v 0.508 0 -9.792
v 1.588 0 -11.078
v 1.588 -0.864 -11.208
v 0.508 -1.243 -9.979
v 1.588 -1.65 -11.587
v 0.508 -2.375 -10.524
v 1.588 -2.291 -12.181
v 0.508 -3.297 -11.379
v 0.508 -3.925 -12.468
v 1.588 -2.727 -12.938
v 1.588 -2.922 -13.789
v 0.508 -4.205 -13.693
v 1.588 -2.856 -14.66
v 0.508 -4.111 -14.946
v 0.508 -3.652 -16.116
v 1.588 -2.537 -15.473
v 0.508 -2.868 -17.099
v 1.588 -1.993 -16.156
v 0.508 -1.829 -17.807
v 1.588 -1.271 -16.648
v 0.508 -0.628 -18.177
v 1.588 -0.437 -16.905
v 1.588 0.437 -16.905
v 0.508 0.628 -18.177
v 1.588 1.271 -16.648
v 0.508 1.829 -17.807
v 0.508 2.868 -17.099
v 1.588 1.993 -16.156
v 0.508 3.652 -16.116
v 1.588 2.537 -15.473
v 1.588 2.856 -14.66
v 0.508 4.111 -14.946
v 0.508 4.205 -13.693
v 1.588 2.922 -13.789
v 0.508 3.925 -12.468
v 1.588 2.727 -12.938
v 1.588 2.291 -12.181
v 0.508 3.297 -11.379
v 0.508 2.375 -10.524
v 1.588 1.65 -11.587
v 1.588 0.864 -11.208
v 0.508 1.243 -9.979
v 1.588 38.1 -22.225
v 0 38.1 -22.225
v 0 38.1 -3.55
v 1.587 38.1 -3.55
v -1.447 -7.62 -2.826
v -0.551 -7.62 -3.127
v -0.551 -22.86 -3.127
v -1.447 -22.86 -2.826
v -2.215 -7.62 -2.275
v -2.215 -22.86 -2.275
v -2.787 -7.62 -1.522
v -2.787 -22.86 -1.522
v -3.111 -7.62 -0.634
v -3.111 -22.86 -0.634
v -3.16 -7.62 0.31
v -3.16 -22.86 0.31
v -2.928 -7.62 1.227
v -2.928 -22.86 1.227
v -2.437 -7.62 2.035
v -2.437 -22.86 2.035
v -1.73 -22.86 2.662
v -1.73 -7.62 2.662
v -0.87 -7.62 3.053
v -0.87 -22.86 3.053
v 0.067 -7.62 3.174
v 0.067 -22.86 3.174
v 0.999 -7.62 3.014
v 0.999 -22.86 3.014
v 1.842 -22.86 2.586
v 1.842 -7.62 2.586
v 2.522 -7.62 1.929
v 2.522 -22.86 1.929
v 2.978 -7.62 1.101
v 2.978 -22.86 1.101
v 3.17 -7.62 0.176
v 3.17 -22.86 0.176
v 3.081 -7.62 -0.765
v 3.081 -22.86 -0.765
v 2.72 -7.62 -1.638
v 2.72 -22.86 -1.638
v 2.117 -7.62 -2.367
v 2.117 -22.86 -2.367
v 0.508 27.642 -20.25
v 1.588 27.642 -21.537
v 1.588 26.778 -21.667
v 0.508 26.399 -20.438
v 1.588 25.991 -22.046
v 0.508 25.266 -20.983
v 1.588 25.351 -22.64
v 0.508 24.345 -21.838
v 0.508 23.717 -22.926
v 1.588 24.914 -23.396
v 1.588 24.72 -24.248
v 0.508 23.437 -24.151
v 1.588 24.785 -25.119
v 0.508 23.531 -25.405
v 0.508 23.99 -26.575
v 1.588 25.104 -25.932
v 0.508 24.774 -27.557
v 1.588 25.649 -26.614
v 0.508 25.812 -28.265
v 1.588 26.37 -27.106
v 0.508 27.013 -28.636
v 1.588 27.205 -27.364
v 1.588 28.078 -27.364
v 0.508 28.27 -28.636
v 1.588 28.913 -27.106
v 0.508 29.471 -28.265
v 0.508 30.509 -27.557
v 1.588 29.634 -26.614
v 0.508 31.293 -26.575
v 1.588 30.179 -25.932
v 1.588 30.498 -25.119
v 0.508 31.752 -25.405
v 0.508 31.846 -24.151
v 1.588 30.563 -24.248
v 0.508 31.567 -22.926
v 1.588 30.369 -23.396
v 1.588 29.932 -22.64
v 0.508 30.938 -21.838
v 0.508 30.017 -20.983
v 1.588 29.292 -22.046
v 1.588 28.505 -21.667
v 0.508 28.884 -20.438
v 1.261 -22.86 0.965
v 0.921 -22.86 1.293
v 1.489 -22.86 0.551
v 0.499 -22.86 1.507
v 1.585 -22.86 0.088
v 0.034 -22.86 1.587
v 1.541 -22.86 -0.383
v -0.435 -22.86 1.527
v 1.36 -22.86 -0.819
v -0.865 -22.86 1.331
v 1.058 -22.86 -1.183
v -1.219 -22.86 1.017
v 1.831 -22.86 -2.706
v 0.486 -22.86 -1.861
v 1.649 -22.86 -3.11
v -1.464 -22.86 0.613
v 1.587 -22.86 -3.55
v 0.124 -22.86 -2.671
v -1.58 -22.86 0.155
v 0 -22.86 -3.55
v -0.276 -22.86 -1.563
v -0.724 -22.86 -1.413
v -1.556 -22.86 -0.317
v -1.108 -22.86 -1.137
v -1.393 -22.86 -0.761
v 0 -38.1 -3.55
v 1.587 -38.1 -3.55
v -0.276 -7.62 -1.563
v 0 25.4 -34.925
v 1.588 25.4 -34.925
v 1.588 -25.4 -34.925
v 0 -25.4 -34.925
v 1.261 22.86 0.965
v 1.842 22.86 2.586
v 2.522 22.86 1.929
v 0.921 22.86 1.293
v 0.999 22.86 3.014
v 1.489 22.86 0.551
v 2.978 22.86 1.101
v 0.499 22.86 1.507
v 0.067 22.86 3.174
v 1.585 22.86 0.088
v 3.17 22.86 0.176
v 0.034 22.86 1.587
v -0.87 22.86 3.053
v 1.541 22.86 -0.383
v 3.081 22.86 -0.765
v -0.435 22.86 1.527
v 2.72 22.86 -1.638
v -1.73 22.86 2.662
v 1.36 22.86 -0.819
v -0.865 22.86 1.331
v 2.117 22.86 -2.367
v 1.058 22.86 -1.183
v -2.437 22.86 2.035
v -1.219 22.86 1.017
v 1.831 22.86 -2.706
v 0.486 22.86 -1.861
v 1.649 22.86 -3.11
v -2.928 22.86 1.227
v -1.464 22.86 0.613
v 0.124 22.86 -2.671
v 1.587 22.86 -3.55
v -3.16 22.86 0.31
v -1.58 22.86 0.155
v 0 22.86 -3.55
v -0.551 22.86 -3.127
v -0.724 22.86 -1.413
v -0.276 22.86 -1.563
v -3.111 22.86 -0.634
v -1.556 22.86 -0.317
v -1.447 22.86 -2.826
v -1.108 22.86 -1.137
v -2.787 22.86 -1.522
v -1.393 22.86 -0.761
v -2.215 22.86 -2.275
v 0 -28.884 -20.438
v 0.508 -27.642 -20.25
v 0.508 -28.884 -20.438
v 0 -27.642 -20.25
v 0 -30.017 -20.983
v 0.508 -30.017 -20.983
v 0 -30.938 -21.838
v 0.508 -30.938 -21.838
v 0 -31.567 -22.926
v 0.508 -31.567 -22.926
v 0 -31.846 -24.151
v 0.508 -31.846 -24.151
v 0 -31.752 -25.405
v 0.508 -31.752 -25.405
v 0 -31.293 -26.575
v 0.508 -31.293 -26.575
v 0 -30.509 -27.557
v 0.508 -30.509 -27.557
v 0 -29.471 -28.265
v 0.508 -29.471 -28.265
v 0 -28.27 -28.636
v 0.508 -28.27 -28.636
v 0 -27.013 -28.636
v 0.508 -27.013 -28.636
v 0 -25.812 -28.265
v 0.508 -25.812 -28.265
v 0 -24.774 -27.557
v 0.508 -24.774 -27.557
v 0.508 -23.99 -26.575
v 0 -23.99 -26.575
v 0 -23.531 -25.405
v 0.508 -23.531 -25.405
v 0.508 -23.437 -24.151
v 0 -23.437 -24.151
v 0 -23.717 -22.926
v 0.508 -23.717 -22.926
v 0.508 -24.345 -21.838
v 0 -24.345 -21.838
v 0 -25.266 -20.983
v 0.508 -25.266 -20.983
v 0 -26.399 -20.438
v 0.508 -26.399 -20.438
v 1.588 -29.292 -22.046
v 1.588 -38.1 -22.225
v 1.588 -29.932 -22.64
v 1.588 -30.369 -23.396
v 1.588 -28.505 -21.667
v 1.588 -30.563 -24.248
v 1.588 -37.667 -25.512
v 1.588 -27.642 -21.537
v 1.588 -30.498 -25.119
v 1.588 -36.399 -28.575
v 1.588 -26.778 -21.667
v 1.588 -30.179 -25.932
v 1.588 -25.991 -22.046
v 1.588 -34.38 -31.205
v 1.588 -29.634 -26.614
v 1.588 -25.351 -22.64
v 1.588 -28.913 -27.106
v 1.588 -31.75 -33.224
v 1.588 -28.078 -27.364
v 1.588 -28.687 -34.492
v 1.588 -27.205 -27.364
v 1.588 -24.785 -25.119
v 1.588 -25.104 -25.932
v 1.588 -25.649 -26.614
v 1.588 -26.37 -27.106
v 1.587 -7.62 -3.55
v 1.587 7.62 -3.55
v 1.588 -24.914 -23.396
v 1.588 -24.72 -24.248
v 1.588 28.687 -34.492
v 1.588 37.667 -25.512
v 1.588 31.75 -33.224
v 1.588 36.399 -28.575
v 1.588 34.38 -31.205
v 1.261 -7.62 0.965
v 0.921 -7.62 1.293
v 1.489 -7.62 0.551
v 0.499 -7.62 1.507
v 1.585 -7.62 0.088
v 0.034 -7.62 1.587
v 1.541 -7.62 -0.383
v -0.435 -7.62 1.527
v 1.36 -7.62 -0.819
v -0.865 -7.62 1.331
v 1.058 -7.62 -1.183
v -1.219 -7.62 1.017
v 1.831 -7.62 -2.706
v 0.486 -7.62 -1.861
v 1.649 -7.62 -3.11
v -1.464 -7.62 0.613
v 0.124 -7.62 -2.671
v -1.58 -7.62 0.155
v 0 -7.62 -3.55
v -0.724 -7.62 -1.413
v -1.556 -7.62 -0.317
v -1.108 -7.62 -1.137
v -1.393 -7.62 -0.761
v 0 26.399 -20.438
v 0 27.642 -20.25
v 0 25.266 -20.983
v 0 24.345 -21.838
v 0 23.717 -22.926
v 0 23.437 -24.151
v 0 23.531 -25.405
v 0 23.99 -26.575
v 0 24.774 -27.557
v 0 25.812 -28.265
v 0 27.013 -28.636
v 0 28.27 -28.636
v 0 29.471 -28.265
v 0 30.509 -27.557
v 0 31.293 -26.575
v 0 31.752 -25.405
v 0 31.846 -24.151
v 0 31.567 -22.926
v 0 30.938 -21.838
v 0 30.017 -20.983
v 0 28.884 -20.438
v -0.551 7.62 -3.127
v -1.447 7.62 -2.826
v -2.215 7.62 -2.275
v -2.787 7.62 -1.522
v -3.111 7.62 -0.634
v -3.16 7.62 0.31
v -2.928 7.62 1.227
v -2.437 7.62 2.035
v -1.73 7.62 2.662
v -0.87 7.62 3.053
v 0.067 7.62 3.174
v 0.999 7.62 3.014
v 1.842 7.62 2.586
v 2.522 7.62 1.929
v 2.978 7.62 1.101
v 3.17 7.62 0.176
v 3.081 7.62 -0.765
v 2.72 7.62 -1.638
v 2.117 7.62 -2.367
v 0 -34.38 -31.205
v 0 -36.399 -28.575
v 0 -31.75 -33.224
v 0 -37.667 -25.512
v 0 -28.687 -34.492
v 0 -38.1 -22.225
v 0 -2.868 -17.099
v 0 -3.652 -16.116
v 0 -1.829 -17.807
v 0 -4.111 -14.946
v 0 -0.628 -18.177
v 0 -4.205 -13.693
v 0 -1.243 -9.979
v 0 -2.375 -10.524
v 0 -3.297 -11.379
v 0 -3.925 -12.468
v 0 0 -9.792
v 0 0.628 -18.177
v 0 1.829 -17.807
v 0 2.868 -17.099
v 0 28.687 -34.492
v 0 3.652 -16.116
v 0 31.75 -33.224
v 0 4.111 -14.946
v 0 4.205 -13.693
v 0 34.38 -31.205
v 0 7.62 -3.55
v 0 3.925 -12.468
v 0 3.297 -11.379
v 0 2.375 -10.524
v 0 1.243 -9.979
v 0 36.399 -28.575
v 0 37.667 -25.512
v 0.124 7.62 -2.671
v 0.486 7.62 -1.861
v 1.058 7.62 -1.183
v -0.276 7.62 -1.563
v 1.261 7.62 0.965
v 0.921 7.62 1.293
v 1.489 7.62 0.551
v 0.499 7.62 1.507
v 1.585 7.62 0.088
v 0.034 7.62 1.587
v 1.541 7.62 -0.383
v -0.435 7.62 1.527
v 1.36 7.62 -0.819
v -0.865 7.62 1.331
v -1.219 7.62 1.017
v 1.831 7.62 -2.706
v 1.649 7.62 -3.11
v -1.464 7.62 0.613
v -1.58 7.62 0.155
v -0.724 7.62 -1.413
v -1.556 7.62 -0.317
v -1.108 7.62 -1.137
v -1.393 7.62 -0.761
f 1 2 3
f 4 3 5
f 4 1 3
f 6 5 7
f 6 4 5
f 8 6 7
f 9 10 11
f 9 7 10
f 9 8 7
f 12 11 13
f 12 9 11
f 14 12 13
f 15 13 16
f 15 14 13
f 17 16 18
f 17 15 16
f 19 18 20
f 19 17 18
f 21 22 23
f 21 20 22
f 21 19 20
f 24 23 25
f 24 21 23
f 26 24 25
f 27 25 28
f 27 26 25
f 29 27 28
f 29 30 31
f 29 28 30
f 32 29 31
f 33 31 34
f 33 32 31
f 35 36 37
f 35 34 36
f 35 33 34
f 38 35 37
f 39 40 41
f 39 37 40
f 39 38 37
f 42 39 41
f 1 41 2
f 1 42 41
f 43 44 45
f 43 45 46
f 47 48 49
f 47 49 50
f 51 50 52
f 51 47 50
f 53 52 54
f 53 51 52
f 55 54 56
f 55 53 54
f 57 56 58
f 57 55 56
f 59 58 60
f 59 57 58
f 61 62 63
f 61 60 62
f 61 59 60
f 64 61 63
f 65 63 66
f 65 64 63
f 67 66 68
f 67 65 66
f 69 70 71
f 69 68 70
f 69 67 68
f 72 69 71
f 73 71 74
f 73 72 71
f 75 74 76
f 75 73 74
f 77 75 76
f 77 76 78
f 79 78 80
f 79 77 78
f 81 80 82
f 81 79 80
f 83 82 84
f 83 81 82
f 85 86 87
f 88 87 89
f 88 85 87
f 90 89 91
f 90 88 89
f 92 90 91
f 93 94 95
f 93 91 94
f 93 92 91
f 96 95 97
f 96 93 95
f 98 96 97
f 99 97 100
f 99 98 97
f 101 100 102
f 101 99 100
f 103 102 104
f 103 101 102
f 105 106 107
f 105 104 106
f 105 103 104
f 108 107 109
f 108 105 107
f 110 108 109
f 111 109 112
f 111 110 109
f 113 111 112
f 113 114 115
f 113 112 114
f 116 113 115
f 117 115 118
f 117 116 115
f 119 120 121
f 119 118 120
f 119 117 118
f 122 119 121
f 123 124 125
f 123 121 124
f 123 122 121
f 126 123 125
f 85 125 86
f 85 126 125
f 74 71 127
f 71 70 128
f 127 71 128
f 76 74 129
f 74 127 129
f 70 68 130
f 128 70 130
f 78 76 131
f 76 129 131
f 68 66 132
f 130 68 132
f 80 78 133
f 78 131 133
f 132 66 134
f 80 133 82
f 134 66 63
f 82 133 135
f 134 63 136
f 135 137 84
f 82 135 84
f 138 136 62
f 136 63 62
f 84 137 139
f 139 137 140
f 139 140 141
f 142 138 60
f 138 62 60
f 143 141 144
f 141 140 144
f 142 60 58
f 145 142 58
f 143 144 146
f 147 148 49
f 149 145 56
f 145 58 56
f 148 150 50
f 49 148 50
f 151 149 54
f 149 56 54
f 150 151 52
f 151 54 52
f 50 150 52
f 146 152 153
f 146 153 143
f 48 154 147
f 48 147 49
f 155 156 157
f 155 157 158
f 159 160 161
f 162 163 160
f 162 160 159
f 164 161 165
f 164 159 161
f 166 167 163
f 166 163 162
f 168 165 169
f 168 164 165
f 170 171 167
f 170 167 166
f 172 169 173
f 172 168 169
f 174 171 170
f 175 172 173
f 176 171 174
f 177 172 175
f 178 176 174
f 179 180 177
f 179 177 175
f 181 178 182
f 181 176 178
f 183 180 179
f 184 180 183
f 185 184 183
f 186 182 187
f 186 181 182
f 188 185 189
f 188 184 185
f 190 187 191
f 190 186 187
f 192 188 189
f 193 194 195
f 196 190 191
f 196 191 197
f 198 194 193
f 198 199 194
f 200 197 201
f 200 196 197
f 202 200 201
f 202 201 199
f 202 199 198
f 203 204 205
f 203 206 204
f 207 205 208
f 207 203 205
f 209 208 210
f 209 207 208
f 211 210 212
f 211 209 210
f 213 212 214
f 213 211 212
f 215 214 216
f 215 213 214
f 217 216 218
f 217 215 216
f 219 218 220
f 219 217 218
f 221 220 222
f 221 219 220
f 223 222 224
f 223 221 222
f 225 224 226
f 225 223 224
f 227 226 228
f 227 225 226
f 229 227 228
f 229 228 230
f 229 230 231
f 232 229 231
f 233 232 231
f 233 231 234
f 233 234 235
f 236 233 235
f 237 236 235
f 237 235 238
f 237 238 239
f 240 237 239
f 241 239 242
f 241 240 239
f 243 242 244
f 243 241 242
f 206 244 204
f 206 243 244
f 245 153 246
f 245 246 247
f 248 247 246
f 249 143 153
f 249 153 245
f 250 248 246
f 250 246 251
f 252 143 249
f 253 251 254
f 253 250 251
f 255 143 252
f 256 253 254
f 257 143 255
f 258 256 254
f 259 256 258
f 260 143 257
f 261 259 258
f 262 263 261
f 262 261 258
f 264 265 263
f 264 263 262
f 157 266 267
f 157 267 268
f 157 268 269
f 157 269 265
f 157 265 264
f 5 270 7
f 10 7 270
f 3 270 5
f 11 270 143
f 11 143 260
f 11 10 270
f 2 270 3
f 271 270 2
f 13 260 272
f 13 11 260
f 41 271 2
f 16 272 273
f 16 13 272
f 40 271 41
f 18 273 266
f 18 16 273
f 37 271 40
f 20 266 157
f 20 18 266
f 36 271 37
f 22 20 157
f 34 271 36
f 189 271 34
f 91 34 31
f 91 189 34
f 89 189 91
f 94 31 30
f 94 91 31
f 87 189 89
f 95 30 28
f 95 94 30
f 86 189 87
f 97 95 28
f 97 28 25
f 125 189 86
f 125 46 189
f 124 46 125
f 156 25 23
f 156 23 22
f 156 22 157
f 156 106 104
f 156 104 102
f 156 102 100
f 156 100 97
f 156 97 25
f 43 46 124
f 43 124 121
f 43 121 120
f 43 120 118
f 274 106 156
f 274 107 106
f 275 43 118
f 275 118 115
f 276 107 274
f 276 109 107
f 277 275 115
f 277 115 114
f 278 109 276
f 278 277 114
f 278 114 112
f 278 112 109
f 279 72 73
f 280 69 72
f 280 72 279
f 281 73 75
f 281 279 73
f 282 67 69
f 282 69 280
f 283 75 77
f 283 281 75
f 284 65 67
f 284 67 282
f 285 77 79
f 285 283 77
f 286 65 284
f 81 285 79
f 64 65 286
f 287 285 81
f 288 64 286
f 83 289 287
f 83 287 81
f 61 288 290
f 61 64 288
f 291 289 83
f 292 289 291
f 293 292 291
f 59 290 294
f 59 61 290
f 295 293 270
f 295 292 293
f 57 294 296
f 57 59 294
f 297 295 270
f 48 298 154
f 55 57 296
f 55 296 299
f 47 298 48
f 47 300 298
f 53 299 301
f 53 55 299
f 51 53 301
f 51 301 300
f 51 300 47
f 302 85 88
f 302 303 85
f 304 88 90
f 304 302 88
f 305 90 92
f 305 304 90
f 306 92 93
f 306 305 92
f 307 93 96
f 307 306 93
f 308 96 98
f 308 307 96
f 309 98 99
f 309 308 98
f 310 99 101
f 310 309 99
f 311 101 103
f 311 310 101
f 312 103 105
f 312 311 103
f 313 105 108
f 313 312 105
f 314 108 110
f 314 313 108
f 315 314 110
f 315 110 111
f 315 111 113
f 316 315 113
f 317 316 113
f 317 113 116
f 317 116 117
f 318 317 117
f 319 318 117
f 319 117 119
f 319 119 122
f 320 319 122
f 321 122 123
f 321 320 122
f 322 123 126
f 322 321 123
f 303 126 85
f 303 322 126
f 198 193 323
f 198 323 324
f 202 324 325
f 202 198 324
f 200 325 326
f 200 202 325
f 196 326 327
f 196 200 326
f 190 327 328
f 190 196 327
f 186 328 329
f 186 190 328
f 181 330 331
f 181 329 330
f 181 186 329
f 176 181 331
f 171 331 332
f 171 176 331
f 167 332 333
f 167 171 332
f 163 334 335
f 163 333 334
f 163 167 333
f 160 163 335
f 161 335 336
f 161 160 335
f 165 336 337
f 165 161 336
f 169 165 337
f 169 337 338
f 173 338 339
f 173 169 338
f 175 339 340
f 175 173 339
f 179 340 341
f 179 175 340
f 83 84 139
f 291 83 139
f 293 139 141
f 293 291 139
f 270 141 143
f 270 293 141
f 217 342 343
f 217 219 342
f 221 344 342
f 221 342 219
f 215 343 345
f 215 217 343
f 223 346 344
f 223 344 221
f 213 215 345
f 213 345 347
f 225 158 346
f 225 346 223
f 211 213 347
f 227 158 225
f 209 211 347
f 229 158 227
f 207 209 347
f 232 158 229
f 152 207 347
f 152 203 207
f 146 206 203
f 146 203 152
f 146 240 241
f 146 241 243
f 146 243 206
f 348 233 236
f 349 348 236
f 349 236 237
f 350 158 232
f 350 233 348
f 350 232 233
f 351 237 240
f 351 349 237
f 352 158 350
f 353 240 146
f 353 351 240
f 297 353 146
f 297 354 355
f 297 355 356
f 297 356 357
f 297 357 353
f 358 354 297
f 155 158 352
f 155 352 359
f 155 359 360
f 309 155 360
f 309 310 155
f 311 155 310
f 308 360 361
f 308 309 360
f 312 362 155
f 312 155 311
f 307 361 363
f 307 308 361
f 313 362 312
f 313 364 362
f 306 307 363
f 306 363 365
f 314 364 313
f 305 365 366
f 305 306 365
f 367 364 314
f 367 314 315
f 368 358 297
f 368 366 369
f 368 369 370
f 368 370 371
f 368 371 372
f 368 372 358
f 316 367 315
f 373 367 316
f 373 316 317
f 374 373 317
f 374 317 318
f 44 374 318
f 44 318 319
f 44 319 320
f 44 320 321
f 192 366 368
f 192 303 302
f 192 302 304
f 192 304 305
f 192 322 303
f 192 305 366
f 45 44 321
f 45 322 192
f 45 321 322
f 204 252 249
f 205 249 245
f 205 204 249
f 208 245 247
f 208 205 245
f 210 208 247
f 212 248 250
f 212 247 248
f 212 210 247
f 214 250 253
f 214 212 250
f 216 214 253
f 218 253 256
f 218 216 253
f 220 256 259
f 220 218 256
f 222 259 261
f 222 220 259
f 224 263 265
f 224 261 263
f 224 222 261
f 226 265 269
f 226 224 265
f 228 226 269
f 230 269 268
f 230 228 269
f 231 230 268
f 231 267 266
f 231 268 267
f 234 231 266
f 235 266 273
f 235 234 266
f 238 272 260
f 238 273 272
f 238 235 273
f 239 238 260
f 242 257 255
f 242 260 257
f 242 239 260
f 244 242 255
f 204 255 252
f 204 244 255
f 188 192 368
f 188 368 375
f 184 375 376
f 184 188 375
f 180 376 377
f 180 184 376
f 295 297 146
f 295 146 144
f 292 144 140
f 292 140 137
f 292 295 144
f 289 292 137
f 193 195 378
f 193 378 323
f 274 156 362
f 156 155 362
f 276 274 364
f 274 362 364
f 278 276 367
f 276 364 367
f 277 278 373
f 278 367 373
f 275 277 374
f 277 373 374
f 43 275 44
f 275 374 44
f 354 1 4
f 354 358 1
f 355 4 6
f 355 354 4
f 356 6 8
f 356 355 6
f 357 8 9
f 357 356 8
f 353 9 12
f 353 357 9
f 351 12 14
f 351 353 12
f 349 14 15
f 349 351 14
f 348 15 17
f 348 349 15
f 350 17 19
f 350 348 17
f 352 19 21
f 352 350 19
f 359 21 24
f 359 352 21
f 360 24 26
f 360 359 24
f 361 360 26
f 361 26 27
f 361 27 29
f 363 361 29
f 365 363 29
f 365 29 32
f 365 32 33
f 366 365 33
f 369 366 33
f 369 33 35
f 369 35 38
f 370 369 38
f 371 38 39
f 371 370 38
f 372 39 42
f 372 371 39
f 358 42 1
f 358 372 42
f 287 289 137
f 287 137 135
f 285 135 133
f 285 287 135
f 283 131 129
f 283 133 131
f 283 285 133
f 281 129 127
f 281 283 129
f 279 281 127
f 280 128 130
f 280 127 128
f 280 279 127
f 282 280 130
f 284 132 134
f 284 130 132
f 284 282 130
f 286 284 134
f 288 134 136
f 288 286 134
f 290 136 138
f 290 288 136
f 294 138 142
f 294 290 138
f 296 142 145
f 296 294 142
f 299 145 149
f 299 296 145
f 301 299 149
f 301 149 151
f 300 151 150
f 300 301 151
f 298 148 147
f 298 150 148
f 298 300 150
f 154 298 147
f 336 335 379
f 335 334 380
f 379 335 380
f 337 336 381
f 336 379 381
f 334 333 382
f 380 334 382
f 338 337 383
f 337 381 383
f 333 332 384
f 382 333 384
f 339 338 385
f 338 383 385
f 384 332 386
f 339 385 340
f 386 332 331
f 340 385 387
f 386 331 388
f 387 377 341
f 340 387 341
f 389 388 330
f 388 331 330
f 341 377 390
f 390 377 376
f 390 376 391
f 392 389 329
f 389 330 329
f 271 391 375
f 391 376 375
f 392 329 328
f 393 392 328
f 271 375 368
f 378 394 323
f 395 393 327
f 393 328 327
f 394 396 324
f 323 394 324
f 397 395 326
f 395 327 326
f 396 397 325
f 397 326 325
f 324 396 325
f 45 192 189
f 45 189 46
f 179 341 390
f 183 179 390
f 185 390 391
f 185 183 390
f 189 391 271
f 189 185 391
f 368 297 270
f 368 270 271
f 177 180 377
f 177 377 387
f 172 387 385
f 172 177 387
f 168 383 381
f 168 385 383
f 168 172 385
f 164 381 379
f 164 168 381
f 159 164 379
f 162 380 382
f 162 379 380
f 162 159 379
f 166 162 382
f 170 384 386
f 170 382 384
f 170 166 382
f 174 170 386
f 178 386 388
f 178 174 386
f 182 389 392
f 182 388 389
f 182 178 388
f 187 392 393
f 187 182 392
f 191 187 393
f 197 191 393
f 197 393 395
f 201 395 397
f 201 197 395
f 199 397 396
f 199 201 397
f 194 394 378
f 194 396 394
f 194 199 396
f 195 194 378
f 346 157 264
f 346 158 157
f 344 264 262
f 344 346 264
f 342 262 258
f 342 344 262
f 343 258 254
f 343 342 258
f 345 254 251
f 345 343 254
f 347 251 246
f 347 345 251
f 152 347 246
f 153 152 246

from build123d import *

# Parameters (mm, degrees)
BOSS_EXTRUDE1_DEPTH                       = 38.1
SKETCH3_W                                 = 6.724757914
SKETCH3_H                                 = 15.24
CUT_EXTRUDE1_DEPTH                        = 4.175
CUT_EXTRUDE1_DEPTH_BACK                   = 4.175
CSK_FOR_8_FLAT_HEAD_MACHINE_SCREW_2_COUNT = 2
CSK_FOR_8_FLAT_HEAD_MACHINE_SCREW_2_PITCH = 29.553945574
CSK_FOR_8_FLAT_HEAD_MACHINE_SCREW_3_COUNT = 2
CSK_FOR_8_FLAT_HEAD_MACHINE_SCREW_3_PITCH = 55.283171943
FILLET1_R                                 = 12.7


with BuildPart() as part:
    # Sketch2 → Boss-Extrude1 (new body, symmetric)
    with BuildSketch(Plane(origin=(0, 0, 0), x_dir=(1, 0, 0), z_dir=(0, 1, 0))):
        with BuildLine():
            Line((1.5875, 34.925), (0, 34.925))
            Line((0, 34.925), (0, 3.549757914))
            ThreePointArc((0, 3.549757914), (0.2766348, 2.253569592), (1.058333333, 1.183252638))
            ThreePointArc((1.058333333, 1.183252638), (-0.435047689, -1.526725175), (-0.275666482, 1.563382308))
            Line((-0.275666482, 1.563382308), (-0.551332964, 3.126764616))
            ThreePointArc((-0.551332964, 3.126764616), (-0.870095378, -3.053450349), (2.116666667, 2.366505276))
            ThreePointArc((2.116666667, 2.366505276), (1.7258174, 2.901663753), (1.5875, 3.549757914))
            Line((1.5875, 3.549757914), (1.5875, 34.925))
        make_face()
    extrude(amount=BOSS_EXTRUDE1_DEPTH, both=True)

    # Sketch3 → Cut-Extrude1 (cut, two sides)
    with BuildSketch(Plane(origin=(0, 0, 0), x_dir=(0, 0, -1), z_dir=(1, 0, 0))) as cut_extrude1_sk:
        with Locations((0.187378957, 30.48)):
            Rectangle(SKETCH3_W, SKETCH3_H)
        with Locations((0.187378957, 0)):
            Rectangle(SKETCH3_W, SKETCH3_H)
        with Locations((0.187378957, -30.48)):
            Rectangle(SKETCH3_W, SKETCH3_H)
    extrude(amount=CUT_EXTRUDE1_DEPTH, mode=Mode.SUBTRACT)
    extrude(cut_extrude1_sk.sketch, amount=-CUT_EXTRUDE1_DEPTH_BACK, mode=Mode.SUBTRACT)

    # Sketch4 → CSK for #8 Flat Head Machine Screw (100)1 (revolve, cut)
    with BuildSketch(Plane(origin=(0, -27.641585971, -24.466585971), x_dir=(0, 0, 1), z_dir=(0, 1, 0))):
        Polygon((0, 0), (0, 3.175), (2.2479, 3.175), (2.2479, 2.159767624), (4.2164, 0.508), (4.2164, 0), align=None)
    csk_for_8_flat_head_machine_screw_100 = revolve(axis=Axis((-6.35, -27.641585971, -24.466585971), (1, 0, 0)), mode=Mode.SUBTRACT)

    # CSK for _8 Flat Head Machine Screw _ 2: CSK for #8 Flat Head Machine Screw (100)1 ×2
    with Locations(*[Vector(0, 0.935292579, 0.35387539) * (i * CSK_FOR_8_FLAT_HEAD_MACHINE_SCREW_2_PITCH) for i in range(1, CSK_FOR_8_FLAT_HEAD_MACHINE_SCREW_2_COUNT)]):
        add(csk_for_8_flat_head_machine_screw_100, mode=Mode.SUBTRACT)

    # CSK for _8 Flat Head Machine Screw _ 3: CSK for #8 Flat Head Machine Screw (100)1 ×2
    with Locations(*[(0, i * CSK_FOR_8_FLAT_HEAD_MACHINE_SCREW_3_PITCH, 0) for i in range(1, CSK_FOR_8_FLAT_HEAD_MACHINE_SCREW_3_COUNT)]):
        add(csk_for_8_flat_head_machine_screw_100, mode=Mode.SUBTRACT)

    # Fillet1
    fillet1_edges = [part.edges().sort_by_distance(p)[0] for p in [
        (0.79375, 38.1, -34.925),
        (0.79375, -38.1, -34.925),
    ]]
    fillet(fillet1_edges, radius=FILLET1_R)


solid = part.part
